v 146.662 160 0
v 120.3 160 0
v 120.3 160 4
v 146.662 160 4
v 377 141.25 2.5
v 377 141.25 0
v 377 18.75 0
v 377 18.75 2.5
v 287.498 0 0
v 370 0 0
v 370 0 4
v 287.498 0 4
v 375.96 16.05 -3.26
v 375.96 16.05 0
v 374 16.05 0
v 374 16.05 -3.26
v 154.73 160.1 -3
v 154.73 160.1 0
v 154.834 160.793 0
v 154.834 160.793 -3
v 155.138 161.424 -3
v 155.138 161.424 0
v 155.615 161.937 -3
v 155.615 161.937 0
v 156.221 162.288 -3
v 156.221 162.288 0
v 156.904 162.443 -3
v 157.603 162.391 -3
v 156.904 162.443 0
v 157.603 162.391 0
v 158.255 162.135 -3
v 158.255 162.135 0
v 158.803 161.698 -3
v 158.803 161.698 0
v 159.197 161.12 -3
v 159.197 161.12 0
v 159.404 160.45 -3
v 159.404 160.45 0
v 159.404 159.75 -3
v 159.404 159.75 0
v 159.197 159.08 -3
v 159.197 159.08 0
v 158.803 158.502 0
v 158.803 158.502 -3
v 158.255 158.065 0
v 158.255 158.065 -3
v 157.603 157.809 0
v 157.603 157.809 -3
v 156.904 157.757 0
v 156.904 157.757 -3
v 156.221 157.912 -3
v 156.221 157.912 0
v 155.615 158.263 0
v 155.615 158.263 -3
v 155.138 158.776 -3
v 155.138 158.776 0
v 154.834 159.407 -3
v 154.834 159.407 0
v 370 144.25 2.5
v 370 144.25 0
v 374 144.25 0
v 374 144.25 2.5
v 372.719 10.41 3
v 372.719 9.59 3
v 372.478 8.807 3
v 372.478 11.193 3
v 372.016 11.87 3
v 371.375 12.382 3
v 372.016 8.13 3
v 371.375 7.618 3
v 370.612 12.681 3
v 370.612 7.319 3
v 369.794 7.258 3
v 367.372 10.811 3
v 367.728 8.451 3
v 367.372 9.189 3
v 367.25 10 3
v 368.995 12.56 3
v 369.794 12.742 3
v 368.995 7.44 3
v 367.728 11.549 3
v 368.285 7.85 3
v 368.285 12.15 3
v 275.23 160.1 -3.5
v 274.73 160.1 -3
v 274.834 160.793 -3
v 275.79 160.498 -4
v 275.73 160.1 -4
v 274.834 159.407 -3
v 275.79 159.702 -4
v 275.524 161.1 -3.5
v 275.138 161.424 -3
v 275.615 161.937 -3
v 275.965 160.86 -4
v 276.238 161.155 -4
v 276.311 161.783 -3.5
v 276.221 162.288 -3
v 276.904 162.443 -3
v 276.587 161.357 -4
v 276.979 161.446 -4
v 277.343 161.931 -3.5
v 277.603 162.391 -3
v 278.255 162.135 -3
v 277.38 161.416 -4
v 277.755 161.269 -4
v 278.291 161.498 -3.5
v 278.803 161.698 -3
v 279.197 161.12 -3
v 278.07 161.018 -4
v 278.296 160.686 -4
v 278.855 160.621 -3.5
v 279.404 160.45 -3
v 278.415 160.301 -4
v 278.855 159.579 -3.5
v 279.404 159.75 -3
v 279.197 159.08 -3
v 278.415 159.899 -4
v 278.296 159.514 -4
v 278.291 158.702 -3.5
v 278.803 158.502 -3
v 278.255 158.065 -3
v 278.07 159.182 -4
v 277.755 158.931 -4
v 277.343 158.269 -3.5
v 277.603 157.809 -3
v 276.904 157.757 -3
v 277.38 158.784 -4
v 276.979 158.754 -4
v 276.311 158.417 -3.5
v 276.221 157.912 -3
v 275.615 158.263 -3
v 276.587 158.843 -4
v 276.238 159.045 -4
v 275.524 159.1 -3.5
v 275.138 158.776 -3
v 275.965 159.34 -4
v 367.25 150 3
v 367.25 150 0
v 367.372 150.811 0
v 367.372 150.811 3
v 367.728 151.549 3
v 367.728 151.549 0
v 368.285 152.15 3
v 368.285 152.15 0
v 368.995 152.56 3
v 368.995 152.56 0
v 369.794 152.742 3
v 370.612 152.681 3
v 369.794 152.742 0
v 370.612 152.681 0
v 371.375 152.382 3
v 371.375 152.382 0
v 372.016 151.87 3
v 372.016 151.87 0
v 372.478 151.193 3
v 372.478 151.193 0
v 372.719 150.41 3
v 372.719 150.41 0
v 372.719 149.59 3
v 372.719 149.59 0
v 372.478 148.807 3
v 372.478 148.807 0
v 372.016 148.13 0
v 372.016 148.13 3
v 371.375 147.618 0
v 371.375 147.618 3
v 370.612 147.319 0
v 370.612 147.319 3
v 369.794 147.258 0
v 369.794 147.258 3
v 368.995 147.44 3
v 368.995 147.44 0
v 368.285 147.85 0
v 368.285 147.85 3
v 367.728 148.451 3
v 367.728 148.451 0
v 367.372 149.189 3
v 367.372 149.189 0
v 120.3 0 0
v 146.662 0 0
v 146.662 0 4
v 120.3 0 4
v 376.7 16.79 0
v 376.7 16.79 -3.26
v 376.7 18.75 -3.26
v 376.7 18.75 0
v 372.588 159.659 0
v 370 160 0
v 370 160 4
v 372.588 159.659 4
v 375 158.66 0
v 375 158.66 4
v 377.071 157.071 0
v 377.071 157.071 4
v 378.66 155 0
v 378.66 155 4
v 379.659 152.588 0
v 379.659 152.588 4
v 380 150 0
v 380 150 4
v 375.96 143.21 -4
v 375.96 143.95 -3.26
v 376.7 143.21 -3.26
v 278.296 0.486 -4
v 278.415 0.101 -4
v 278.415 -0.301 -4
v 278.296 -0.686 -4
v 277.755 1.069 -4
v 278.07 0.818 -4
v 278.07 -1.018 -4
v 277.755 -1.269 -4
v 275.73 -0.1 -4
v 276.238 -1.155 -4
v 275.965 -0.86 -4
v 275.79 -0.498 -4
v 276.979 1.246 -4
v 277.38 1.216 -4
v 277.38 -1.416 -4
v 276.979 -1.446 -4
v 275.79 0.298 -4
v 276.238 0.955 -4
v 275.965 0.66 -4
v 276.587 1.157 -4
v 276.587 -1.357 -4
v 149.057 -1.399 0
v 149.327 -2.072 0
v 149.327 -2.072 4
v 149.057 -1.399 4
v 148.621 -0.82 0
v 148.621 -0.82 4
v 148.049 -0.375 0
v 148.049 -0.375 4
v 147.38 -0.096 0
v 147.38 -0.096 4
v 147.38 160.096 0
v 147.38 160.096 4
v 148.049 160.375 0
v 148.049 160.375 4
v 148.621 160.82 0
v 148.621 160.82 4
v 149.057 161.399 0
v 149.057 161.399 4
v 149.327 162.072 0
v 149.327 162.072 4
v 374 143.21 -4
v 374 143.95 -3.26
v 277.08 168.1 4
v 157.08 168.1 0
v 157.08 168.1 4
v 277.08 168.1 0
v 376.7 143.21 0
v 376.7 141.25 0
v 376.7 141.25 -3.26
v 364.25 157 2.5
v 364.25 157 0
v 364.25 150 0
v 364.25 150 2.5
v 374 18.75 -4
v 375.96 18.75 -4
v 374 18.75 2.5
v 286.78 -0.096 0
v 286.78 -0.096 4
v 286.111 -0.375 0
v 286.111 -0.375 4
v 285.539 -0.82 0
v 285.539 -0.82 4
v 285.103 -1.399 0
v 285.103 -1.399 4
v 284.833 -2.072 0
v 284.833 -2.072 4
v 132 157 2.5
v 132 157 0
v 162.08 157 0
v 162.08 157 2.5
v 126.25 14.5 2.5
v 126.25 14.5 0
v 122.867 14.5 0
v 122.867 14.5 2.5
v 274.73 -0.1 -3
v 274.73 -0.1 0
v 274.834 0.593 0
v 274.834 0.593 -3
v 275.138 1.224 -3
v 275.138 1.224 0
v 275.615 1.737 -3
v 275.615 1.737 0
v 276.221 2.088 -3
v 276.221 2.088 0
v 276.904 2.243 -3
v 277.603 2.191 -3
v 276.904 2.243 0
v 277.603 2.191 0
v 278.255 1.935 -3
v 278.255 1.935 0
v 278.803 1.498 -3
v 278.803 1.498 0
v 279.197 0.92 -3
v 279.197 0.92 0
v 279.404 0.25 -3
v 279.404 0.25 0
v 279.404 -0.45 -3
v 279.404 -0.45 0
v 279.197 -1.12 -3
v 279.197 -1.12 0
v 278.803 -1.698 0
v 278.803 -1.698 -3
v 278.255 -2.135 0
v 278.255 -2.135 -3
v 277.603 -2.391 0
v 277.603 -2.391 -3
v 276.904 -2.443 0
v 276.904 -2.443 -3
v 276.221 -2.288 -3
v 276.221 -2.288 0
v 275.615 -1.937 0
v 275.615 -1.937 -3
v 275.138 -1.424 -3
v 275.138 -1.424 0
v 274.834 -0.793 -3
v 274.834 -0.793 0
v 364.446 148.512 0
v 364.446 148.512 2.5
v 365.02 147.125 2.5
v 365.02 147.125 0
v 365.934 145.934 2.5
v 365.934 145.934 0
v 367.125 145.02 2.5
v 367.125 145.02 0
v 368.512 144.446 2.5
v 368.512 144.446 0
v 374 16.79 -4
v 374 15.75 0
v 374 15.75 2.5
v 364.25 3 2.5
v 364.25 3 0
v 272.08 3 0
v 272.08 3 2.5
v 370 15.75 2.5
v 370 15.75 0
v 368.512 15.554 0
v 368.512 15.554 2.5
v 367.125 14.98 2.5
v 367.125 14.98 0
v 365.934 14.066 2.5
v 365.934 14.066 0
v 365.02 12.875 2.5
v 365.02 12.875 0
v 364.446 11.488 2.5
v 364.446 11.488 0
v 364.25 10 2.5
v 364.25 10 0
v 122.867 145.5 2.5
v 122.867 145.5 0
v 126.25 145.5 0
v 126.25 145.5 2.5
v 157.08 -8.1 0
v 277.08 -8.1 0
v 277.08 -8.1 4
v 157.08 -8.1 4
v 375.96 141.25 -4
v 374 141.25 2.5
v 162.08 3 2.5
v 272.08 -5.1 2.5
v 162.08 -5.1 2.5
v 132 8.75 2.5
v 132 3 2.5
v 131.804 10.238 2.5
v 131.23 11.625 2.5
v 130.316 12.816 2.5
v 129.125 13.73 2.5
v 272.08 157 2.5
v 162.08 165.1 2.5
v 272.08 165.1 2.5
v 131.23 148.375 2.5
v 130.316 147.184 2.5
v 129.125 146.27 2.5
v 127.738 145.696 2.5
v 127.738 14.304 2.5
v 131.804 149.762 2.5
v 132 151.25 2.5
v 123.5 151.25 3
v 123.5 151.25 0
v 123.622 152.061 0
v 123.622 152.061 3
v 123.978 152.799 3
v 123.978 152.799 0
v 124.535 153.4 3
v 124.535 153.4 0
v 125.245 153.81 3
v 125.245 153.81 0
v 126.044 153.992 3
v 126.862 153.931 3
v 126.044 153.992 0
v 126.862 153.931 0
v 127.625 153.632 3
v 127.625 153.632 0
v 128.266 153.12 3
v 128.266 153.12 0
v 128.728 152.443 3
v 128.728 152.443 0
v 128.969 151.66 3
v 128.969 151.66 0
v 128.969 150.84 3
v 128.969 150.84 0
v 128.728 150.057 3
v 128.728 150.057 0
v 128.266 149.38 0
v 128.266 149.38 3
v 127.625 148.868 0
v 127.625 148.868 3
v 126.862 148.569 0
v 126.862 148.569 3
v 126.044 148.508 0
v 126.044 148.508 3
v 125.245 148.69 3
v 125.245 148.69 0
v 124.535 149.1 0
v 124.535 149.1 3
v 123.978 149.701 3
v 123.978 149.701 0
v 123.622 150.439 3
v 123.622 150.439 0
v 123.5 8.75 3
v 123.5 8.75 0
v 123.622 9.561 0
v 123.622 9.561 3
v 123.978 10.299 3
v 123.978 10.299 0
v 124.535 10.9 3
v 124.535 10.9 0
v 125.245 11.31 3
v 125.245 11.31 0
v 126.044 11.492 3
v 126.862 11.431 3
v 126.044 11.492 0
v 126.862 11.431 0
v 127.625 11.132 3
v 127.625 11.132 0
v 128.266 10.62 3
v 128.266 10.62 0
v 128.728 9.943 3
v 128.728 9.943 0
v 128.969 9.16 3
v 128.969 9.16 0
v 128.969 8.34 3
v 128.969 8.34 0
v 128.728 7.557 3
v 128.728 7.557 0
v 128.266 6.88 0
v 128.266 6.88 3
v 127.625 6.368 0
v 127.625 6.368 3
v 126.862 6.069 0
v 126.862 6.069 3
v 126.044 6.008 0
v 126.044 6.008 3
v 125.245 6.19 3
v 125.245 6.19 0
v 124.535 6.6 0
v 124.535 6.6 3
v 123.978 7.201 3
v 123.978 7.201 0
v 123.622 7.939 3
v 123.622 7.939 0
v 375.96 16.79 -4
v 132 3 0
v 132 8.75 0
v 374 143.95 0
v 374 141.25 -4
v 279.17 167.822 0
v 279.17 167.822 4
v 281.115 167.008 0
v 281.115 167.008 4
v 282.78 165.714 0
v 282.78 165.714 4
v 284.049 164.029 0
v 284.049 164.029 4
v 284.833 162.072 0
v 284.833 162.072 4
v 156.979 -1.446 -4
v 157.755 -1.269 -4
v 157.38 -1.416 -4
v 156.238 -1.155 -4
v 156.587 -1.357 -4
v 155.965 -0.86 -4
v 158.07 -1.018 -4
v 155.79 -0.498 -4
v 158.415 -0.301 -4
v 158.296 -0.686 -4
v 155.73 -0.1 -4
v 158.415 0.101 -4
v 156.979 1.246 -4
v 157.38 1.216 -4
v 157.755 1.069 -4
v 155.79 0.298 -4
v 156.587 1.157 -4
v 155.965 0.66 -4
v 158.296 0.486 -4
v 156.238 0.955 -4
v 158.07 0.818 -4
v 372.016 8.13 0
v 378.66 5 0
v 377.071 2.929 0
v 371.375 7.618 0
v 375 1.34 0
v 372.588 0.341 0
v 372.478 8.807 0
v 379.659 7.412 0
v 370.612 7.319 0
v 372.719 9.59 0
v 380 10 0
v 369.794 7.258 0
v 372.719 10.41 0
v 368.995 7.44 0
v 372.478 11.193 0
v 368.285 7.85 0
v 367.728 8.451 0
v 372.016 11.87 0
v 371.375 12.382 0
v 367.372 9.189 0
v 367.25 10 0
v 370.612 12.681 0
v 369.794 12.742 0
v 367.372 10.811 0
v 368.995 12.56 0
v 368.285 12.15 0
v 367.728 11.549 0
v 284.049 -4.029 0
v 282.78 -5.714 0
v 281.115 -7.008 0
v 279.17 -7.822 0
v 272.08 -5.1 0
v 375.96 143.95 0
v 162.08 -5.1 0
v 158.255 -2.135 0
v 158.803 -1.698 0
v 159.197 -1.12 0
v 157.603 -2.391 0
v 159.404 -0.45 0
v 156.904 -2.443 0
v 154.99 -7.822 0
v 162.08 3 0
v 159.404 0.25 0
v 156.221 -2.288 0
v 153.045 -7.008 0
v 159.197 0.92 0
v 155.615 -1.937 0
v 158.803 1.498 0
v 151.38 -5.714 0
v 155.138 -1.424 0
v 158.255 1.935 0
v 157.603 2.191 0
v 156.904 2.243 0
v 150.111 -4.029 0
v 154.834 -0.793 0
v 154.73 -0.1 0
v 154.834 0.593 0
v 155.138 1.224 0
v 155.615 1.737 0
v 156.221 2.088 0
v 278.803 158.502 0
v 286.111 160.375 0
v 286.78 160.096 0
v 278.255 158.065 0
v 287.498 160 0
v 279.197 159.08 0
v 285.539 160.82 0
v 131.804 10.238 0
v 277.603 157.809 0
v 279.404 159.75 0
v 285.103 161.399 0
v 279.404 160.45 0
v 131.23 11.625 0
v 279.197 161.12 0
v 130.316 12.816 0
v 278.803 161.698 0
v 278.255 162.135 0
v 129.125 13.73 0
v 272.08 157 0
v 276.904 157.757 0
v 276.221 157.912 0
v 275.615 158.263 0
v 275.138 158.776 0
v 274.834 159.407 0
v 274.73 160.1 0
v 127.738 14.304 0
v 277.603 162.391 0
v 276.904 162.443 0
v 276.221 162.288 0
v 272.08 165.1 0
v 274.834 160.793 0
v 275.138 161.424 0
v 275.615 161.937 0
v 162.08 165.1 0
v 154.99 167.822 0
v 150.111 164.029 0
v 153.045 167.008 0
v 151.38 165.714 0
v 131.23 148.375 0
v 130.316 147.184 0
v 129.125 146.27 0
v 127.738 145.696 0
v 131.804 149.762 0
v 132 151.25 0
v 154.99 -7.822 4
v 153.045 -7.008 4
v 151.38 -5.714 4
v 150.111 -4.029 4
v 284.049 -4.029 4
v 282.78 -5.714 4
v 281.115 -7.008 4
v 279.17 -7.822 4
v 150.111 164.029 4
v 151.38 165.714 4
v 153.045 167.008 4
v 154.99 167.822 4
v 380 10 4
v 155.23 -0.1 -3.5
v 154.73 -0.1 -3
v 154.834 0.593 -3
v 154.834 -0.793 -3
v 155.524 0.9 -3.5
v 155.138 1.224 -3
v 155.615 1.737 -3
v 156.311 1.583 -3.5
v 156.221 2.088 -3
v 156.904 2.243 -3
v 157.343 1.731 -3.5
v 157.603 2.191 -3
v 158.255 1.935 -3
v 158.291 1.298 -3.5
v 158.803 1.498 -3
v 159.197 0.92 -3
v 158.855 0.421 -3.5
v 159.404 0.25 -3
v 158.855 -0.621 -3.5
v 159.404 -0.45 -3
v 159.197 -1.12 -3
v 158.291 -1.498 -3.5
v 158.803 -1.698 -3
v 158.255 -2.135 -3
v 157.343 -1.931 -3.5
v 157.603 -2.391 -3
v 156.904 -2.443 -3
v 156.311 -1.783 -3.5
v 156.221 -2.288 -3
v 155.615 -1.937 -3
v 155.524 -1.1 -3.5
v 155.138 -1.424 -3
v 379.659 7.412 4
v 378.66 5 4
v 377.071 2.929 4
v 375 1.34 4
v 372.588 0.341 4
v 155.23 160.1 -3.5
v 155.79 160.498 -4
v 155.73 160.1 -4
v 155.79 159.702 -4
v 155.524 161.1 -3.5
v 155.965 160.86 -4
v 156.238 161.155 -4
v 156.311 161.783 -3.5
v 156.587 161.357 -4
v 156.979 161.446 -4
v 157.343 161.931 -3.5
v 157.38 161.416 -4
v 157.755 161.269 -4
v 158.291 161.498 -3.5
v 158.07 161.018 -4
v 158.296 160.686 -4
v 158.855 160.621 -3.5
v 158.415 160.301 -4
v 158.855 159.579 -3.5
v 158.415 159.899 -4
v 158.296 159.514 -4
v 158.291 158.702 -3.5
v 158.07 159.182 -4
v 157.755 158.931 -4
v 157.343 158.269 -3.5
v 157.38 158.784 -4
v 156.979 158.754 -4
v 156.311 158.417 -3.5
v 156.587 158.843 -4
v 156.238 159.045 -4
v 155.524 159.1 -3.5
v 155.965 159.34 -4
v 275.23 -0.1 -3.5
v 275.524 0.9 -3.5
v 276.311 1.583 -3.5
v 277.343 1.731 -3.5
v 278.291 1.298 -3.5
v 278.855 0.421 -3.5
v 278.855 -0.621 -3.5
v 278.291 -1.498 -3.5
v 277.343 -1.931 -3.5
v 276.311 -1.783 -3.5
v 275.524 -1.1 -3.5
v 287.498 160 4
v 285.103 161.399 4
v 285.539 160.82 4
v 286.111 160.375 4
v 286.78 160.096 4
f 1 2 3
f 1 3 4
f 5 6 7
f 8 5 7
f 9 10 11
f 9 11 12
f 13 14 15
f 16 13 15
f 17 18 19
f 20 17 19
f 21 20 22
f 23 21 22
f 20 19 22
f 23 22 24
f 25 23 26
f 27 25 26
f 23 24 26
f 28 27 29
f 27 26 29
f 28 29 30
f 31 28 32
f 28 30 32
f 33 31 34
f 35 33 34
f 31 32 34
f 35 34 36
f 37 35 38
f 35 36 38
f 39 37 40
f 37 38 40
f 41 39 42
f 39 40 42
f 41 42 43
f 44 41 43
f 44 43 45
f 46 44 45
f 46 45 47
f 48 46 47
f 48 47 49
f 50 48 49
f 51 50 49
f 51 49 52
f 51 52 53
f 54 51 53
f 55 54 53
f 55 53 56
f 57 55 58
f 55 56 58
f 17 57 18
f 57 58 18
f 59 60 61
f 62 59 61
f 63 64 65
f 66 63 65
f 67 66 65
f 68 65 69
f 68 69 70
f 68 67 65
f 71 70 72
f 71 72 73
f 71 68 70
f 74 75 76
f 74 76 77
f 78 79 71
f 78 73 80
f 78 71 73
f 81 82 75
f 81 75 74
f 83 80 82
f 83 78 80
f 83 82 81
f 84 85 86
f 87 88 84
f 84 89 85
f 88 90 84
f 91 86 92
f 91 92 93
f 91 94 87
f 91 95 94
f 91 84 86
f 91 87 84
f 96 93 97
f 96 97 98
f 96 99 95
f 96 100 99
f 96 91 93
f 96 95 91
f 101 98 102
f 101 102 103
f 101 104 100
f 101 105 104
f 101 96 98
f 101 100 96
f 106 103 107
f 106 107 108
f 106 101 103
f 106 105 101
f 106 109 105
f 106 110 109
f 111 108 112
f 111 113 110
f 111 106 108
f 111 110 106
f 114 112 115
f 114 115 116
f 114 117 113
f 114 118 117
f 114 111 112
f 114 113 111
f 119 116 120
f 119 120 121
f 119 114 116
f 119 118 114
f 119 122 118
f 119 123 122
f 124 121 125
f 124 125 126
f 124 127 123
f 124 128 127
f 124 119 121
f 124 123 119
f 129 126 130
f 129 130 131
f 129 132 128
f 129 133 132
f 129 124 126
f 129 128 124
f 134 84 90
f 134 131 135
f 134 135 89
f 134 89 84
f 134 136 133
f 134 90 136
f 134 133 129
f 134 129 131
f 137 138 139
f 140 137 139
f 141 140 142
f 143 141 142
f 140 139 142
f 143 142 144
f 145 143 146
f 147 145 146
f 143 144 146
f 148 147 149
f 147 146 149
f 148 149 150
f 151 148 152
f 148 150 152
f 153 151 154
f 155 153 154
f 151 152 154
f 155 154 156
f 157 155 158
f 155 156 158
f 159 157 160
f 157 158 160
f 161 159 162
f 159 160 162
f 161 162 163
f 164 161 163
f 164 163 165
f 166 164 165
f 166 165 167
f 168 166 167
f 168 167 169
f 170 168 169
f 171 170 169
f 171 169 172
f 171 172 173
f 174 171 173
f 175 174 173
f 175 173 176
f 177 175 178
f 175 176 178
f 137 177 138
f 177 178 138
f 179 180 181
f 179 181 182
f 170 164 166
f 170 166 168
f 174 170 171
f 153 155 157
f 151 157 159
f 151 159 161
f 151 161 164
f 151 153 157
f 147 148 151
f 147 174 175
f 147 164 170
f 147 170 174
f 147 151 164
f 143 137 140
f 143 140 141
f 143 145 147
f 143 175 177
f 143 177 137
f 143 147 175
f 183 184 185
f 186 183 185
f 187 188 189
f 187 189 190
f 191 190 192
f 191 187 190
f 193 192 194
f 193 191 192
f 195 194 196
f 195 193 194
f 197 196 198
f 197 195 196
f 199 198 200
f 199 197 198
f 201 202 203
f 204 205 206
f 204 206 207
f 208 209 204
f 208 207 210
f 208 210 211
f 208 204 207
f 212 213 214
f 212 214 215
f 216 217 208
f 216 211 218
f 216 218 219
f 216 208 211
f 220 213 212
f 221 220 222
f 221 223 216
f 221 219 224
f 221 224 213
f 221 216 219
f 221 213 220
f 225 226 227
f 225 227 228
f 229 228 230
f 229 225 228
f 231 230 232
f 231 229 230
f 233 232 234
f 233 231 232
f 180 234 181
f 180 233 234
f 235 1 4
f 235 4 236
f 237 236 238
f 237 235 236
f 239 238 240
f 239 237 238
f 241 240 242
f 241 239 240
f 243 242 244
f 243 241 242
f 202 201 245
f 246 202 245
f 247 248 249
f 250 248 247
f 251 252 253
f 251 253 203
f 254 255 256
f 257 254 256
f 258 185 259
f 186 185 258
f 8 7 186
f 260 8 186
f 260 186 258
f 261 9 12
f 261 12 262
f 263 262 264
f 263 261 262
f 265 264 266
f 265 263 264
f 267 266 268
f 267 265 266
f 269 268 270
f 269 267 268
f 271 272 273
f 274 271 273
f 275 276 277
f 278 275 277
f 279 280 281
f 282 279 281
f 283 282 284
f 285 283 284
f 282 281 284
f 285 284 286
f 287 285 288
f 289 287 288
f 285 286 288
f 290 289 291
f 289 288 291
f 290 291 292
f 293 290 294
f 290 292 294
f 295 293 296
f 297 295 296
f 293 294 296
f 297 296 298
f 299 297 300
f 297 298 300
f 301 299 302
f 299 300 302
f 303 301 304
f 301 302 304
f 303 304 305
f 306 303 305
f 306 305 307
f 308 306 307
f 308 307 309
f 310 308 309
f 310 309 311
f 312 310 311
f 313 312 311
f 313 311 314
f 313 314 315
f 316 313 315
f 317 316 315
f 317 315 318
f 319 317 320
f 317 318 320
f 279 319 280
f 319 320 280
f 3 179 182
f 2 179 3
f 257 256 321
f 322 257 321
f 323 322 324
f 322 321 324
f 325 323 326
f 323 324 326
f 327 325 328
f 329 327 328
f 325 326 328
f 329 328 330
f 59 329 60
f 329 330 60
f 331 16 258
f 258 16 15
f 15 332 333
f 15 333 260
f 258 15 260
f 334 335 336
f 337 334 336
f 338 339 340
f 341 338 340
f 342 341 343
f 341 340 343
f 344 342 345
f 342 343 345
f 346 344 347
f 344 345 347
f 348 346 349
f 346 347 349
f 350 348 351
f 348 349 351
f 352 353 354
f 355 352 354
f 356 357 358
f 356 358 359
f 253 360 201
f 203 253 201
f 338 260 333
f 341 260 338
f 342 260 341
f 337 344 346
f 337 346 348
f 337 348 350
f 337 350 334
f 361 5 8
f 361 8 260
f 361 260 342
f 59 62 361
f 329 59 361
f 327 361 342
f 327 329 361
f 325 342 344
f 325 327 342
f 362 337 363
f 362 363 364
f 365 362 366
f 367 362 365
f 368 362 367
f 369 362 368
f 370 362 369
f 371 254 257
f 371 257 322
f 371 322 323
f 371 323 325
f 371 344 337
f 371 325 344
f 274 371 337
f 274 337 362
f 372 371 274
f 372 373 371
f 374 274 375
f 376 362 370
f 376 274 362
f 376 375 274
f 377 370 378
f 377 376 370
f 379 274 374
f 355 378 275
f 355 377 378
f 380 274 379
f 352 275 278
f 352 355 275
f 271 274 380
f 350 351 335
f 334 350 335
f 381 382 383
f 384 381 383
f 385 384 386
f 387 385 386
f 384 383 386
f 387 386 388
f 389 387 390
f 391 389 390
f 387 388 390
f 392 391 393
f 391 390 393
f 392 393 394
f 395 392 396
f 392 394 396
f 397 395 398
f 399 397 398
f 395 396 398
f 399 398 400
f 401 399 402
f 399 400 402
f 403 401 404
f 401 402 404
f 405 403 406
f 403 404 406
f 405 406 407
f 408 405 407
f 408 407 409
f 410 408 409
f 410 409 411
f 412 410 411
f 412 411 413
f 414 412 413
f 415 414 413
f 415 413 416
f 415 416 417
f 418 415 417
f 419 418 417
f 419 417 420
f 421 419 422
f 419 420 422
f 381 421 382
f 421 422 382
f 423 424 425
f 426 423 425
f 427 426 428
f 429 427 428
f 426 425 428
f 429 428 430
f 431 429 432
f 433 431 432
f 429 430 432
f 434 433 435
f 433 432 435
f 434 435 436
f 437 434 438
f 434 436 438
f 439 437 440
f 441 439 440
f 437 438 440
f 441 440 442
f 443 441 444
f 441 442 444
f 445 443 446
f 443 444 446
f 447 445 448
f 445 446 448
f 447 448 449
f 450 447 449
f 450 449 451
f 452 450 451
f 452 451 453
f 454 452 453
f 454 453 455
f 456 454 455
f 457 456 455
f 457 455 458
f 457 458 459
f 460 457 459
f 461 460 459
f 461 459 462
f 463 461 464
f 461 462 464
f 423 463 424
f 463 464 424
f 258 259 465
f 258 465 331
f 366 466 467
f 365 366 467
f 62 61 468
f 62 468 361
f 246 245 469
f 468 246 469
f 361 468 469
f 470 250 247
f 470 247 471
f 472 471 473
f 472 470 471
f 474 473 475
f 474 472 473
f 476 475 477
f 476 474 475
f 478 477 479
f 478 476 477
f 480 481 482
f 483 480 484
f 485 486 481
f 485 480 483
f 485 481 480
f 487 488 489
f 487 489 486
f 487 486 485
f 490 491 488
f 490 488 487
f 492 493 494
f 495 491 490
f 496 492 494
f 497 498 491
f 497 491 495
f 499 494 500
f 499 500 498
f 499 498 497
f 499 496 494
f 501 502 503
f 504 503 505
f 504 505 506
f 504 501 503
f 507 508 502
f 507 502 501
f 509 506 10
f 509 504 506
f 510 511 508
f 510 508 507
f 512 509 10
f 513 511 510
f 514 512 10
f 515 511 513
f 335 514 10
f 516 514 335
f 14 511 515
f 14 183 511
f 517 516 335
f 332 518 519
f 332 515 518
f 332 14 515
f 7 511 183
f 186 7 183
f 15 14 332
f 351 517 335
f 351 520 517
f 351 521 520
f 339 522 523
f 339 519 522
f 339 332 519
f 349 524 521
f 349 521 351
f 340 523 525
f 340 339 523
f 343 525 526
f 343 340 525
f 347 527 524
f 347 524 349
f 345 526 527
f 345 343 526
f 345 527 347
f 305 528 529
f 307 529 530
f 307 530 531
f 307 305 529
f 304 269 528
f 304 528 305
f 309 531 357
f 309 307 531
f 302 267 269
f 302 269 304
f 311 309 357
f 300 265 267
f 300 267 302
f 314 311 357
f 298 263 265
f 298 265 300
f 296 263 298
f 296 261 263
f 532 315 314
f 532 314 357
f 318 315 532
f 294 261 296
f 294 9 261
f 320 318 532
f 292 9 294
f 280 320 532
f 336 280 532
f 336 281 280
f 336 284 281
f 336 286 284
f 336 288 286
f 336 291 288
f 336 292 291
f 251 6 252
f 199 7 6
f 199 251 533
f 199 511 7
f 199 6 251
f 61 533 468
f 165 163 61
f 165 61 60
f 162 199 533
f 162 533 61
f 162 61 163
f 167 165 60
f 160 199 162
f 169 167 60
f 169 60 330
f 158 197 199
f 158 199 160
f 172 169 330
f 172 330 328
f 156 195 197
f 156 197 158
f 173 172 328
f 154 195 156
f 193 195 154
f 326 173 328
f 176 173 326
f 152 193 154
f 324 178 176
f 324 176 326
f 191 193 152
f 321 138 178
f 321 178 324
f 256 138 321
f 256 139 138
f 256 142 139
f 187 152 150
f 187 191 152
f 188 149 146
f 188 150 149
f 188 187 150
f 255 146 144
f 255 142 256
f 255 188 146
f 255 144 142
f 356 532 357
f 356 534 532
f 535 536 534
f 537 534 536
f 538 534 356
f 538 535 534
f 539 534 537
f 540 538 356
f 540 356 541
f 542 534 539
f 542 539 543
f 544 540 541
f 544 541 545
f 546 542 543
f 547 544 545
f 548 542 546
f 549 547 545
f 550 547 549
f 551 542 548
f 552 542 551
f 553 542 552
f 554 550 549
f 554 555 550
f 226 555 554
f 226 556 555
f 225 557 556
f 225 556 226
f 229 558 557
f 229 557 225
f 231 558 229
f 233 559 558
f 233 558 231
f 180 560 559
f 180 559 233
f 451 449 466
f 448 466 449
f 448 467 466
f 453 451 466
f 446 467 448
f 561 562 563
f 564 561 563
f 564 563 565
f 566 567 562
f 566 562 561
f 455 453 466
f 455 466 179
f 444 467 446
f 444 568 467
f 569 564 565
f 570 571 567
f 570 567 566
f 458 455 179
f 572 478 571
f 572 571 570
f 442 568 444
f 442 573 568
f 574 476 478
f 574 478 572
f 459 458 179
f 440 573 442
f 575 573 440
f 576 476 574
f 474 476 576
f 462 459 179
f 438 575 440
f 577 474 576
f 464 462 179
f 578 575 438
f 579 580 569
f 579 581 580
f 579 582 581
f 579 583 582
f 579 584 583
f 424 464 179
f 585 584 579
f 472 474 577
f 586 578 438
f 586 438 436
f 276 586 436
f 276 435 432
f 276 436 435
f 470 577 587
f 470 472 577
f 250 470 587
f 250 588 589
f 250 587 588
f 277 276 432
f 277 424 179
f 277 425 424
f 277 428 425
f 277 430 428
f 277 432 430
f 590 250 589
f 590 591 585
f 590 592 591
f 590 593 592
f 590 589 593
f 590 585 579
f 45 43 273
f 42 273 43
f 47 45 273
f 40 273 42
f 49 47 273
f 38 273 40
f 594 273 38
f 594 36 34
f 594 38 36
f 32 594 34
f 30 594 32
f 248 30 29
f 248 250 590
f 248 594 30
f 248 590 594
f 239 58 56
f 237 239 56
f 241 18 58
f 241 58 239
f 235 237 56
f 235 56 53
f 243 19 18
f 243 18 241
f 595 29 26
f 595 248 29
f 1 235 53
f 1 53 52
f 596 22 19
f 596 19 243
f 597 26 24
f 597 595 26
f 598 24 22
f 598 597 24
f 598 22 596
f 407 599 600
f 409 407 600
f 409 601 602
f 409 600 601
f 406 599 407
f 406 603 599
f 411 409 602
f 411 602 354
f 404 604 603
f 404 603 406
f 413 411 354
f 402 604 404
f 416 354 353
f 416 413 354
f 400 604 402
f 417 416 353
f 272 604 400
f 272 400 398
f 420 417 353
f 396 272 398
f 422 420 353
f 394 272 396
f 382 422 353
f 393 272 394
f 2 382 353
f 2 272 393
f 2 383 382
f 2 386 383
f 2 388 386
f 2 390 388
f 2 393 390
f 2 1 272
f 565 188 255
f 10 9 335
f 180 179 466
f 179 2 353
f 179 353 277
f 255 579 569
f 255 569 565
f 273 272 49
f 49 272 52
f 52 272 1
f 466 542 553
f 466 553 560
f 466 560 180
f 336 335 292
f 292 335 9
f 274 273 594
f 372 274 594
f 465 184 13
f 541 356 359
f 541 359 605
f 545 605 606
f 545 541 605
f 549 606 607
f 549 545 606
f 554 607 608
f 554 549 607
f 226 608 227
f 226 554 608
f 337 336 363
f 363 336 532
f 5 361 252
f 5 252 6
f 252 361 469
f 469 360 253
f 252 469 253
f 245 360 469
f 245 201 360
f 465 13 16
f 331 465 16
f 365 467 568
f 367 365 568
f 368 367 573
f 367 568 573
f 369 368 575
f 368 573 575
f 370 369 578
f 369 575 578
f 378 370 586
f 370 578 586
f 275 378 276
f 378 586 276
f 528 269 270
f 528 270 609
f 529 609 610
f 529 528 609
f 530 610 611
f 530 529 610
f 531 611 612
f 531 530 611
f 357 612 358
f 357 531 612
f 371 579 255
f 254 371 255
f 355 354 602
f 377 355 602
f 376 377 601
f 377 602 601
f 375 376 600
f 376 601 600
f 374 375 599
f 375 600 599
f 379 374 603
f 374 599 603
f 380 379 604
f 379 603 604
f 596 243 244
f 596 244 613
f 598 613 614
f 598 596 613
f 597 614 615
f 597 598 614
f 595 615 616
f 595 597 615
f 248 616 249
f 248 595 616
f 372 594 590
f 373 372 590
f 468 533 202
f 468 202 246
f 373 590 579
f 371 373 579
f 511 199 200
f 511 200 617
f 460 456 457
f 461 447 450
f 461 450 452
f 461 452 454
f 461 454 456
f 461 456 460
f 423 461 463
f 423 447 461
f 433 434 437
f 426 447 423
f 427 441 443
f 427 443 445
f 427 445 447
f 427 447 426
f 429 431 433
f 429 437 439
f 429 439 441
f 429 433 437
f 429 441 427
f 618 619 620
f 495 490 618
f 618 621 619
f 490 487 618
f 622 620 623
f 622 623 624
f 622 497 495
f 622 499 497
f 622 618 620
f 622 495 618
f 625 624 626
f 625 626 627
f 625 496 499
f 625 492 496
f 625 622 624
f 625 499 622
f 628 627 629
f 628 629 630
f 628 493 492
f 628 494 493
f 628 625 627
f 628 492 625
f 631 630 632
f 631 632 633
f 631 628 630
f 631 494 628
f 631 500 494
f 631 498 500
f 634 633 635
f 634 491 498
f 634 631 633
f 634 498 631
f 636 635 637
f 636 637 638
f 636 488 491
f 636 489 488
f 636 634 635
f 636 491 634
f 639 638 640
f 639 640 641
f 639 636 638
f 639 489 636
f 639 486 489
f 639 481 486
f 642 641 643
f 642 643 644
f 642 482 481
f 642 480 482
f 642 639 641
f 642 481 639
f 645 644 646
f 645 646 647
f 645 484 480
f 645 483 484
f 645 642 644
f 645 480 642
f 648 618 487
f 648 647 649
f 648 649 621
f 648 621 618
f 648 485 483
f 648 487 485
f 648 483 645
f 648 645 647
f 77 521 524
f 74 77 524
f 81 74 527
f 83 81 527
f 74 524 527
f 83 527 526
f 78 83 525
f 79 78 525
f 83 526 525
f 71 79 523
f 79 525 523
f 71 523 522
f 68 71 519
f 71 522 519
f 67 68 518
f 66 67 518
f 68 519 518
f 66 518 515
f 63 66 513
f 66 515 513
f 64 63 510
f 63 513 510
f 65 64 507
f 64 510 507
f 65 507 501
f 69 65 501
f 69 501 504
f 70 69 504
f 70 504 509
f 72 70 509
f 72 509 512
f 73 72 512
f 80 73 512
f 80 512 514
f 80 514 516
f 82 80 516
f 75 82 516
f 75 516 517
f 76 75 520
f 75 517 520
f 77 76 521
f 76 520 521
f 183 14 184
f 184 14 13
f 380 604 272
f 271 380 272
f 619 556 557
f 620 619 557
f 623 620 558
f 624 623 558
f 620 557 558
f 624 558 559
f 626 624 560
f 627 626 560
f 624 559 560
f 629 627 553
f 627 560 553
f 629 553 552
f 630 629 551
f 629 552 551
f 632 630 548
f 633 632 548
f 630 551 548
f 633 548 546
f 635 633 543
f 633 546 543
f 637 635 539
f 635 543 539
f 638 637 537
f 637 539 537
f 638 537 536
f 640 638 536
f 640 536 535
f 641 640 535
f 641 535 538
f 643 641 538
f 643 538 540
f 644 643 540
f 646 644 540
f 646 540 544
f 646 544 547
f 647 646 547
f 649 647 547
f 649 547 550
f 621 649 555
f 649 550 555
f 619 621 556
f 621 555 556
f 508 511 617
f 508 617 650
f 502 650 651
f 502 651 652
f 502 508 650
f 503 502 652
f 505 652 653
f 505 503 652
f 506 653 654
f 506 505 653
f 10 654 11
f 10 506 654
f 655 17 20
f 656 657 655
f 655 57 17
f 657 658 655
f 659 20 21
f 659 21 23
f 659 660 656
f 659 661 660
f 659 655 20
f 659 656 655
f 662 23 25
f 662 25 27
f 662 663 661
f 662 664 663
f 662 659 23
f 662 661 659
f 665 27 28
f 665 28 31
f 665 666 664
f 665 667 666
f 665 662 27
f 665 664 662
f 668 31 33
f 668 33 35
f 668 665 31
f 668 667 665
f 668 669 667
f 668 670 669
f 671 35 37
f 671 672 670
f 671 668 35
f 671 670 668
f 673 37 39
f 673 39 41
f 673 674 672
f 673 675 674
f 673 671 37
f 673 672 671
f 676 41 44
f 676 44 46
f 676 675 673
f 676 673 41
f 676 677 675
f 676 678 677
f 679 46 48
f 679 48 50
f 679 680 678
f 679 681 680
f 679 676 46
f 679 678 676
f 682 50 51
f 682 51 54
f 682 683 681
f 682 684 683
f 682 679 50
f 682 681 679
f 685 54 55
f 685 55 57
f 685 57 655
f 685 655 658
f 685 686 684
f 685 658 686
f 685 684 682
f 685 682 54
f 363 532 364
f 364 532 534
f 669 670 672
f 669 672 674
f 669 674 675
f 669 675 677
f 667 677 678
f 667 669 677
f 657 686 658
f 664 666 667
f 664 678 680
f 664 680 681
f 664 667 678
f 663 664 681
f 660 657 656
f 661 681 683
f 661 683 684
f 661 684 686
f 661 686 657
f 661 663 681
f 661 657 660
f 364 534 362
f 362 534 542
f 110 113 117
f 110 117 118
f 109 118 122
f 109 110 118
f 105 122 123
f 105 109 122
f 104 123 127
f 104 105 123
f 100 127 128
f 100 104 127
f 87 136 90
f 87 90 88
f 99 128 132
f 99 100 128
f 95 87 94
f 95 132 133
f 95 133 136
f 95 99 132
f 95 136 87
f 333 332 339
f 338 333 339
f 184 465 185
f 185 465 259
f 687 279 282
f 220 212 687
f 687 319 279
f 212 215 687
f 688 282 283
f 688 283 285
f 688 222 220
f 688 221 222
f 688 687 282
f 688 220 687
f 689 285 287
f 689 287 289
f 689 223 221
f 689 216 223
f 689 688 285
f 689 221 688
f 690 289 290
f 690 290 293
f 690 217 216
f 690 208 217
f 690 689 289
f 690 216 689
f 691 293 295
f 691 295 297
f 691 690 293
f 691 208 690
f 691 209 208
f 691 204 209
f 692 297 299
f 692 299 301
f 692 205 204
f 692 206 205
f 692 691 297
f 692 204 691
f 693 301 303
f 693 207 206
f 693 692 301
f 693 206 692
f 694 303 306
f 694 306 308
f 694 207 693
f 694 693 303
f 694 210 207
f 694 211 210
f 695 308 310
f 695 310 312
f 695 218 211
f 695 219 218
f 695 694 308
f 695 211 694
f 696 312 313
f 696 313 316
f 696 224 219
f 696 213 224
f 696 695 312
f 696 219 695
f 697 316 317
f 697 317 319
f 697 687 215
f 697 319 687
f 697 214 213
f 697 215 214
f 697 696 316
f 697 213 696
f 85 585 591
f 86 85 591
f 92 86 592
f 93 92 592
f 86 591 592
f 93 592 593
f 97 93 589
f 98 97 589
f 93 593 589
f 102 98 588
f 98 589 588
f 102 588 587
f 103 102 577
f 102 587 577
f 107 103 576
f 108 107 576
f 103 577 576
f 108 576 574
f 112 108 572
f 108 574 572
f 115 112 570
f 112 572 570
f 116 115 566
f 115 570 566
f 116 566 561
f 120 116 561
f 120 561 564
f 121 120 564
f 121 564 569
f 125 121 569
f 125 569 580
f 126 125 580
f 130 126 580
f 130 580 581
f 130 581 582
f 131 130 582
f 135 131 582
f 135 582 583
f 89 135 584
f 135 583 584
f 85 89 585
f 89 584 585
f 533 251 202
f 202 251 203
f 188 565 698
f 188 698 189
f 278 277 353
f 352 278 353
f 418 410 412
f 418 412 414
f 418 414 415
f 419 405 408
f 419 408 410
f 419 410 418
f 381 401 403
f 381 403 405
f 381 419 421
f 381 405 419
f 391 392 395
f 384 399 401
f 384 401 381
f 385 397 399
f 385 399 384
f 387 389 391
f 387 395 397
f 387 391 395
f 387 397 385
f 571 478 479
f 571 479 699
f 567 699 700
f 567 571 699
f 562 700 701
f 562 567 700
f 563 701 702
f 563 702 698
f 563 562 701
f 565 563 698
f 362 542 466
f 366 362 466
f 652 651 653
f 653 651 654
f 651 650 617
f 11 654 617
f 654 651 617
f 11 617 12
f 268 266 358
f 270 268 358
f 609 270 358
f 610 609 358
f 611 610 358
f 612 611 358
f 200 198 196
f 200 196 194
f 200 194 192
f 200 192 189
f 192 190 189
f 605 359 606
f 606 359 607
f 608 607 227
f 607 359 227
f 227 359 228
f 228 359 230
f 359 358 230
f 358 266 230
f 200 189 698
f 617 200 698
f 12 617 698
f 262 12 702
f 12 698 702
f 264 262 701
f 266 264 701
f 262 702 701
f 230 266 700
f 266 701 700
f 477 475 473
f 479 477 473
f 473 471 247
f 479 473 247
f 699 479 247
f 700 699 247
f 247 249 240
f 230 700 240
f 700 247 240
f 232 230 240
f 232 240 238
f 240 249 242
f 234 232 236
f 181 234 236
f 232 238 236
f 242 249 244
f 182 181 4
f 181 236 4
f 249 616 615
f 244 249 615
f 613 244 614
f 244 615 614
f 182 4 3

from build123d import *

# Parameters (mm, degrees)
BOSS_EXTRUDE1_DEPTH = 4
SKETCH2_R           = 2.75
CUT_EXTRUDE1_DEPTH  = 3
SKETCH3_R           = 2.35
BOSS_EXTRUDE2_DEPTH = 4
CHAMFER1_SIZE       = 1
CUT_EXTRUDE2_DEPTH  = 2.5
SKETCH6_W           = 2.7
SKETCH6_H           = 2.7
BOSS_EXTRUDE3_DEPTH = 4
CHAMFER2_SIZE       = 0.74


with BuildPart() as part:
    # Sketch1 → Boss-Extrude1 (new body)
    with BuildSketch(Plane.XY):
        with BuildLine():
            Line((120.3, 160), (146.661746787, 160))
            ThreePointArc((146.661746787, 160), (148.349682778, 160.578969808), (149.32688133, 162.072093023))
            ThreePointArc((149.32688133, 162.072093023), (152.169640756, 166.415724194), (157.08, 168.1))
            Line((157.08, 168.1), (277.08, 168.1))
            ThreePointArc((277.08, 168.1), (281.990359244, 166.415724194), (284.83311867, 162.072093023))
            ThreePointArc((284.83311867, 162.072093023), (285.810317222, 160.578969808), (287.498253213, 160))
            Line((287.498253213, 160), (370, 160))
            ThreePointArc((370, 160), (377.071067812, 157.071067812), (380, 150))
            Line((380, 150), (380, 10))
            ThreePointArc((380, 10), (377.071067812, 2.928932188), (370, 0))
            Line((370, 0), (287.498253213, 0))
            ThreePointArc((287.498253213, 0), (285.810317222, -0.578969808), (284.83311867, -2.072093023))
            ThreePointArc((284.83311867, -2.072093023), (281.990359244, -6.415724194), (277.08, -8.1))
            Line((277.08, -8.1), (157.08, -8.1))
            ThreePointArc((157.08, -8.1), (152.169640756, -6.415724194), (149.32688133, -2.072093023))
            ThreePointArc((149.32688133, -2.072093023), (148.349682778, -0.578969808), (146.661746787, 0))
            Line((146.661746787, 0), (120.3, 0))
            Line((120.3, 0), (120.3, 160))
        make_face()
    extrude(amount=BOSS_EXTRUDE1_DEPTH)

    # Sketch2 → Cut-Extrude1 (cut)
    with BuildSketch(Plane(origin=(0, 0, 0), x_dir=(-1, 0, 0), z_dir=(0, 0, -1))):
        with Locations((-126.25, 8.75)):
            Circle(SKETCH2_R)
        with Locations((-126.25, 151.25)):
            Circle(SKETCH2_R)
        with Locations((-370, 10)):
            Circle(SKETCH2_R)
        with Locations((-370, 150)):
            Circle(SKETCH2_R)
    extrude(amount=-CUT_EXTRUDE1_DEPTH, mode=Mode.SUBTRACT)

    # Sketch3 → Boss-Extrude2 (add)
    with BuildSketch(Plane(origin=(0, 0, 0), x_dir=(-1, 0, 0), z_dir=(0, 0, -1))):
        with Locations((-157.08, -0.1)):
            Circle(SKETCH3_R)
        with Locations((-157.08, 160.1)):
            Circle(SKETCH3_R)
        with Locations((-277.08, 160.1)):
            Circle(SKETCH3_R)
        with Locations((-277.08, -0.1)):
            Circle(SKETCH3_R)
    extrude(amount=BOSS_EXTRUDE2_DEPTH)

    # Chamfer1
    chamfer1_edges = [part.edges().sort_by_distance(p)[0] for p in [
        (159.43, -0.1, -4),
        (159.43, 160.1, -4),
        (279.43, 160.1, -4),
        (279.43, -0.1, -4),
    ]]
    chamfer(chamfer1_edges, length=CHAMFER1_SIZE)

    # Sketch4 → Cut-Extrude2 (cut)
    with BuildSketch(Plane(origin=(0, 0, 0), x_dir=(-1, 0, 0), z_dir=(0, 0, -1))):
        with BuildLine():
            ThreePointArc((-370, 15.75), (-365.934136008, 14.065863992), (-364.25, 10))
            Line((-364.25, 10), (-364.25, 3))
            Line((-364.25, 3), (-272.08, 3))
            Line((-272.08, 3), (-272.08, -5.1))
            Line((-272.08, -5.1), (-162.08, -5.1))
            Line((-162.08, -5.1), (-162.08, 3))
            Line((-162.08, 3), (-132, 3))
            Line((-132, 3), (-132, 8.75))
            ThreePointArc((-132, 8.75), (-130.315863992, 12.815863992), (-126.25, 14.5))
            Line((-126.25, 14.5), (-122.867487478, 14.5))
            Line((-122.867487478, 14.5), (-122.867487478, 145.5))
            Line((-122.867487478, 145.5), (-126.25, 145.5))
            ThreePointArc((-126.25, 145.5), (-130.315863992, 147.184136008), (-132, 151.25))
            Line((-132, 151.25), (-132, 157))
            Line((-132, 157), (-162.08, 157))
            Line((-162.08, 157), (-162.08, 165.1))
            Line((-162.08, 165.1), (-272.08, 165.1))
            Line((-272.08, 165.1), (-272.08, 157))
            Line((-272.08, 157), (-364.25, 157))
            Line((-364.25, 157), (-364.25, 150))
            ThreePointArc((-364.25, 150), (-365.934136008, 145.934136008), (-370, 144.25))
            Line((-370, 144.25), (-374, 144.25))
            Line((-374, 144.25), (-374, 141.25))
            Line((-374, 141.25), (-377, 141.25))
            Line((-377, 141.25), (-377, 18.75))
            Line((-377, 18.75), (-374, 18.75))
            Line((-374, 18.75), (-374, 15.75))
            Line((-374, 15.75), (-370, 15.75))
        make_face()
    extrude(amount=-CUT_EXTRUDE2_DEPTH, mode=Mode.SUBTRACT)

    # Sketch6 → Boss-Extrude3 (add)
    with BuildSketch(Plane(origin=(0, 0, 0), x_dir=(-1, 0, 0), z_dir=(0, 0, -1))):
        with Locations((-375.35, 17.4)):
            Rectangle(SKETCH6_W, SKETCH6_H)
        with Locations((-375.35, 142.6)):
            Rectangle(SKETCH6_W, SKETCH6_H)
    extrude(amount=BOSS_EXTRUDE3_DEPTH)

    # Chamfer2
    chamfer2_edges = [part.edges().sort_by_distance(p)[0] for p in [
        (376.7, 16.05, -2),
        (376.7, 17.4, -4),
        (375.35, 16.05, -4),
        (376.7, 143.95, -2),
        (375.35, 143.95, -4),
        (376.7, 142.6, -4),
    ]]
    chamfer(chamfer2_edges, length=CHAMFER2_SIZE)


solid = part.part
